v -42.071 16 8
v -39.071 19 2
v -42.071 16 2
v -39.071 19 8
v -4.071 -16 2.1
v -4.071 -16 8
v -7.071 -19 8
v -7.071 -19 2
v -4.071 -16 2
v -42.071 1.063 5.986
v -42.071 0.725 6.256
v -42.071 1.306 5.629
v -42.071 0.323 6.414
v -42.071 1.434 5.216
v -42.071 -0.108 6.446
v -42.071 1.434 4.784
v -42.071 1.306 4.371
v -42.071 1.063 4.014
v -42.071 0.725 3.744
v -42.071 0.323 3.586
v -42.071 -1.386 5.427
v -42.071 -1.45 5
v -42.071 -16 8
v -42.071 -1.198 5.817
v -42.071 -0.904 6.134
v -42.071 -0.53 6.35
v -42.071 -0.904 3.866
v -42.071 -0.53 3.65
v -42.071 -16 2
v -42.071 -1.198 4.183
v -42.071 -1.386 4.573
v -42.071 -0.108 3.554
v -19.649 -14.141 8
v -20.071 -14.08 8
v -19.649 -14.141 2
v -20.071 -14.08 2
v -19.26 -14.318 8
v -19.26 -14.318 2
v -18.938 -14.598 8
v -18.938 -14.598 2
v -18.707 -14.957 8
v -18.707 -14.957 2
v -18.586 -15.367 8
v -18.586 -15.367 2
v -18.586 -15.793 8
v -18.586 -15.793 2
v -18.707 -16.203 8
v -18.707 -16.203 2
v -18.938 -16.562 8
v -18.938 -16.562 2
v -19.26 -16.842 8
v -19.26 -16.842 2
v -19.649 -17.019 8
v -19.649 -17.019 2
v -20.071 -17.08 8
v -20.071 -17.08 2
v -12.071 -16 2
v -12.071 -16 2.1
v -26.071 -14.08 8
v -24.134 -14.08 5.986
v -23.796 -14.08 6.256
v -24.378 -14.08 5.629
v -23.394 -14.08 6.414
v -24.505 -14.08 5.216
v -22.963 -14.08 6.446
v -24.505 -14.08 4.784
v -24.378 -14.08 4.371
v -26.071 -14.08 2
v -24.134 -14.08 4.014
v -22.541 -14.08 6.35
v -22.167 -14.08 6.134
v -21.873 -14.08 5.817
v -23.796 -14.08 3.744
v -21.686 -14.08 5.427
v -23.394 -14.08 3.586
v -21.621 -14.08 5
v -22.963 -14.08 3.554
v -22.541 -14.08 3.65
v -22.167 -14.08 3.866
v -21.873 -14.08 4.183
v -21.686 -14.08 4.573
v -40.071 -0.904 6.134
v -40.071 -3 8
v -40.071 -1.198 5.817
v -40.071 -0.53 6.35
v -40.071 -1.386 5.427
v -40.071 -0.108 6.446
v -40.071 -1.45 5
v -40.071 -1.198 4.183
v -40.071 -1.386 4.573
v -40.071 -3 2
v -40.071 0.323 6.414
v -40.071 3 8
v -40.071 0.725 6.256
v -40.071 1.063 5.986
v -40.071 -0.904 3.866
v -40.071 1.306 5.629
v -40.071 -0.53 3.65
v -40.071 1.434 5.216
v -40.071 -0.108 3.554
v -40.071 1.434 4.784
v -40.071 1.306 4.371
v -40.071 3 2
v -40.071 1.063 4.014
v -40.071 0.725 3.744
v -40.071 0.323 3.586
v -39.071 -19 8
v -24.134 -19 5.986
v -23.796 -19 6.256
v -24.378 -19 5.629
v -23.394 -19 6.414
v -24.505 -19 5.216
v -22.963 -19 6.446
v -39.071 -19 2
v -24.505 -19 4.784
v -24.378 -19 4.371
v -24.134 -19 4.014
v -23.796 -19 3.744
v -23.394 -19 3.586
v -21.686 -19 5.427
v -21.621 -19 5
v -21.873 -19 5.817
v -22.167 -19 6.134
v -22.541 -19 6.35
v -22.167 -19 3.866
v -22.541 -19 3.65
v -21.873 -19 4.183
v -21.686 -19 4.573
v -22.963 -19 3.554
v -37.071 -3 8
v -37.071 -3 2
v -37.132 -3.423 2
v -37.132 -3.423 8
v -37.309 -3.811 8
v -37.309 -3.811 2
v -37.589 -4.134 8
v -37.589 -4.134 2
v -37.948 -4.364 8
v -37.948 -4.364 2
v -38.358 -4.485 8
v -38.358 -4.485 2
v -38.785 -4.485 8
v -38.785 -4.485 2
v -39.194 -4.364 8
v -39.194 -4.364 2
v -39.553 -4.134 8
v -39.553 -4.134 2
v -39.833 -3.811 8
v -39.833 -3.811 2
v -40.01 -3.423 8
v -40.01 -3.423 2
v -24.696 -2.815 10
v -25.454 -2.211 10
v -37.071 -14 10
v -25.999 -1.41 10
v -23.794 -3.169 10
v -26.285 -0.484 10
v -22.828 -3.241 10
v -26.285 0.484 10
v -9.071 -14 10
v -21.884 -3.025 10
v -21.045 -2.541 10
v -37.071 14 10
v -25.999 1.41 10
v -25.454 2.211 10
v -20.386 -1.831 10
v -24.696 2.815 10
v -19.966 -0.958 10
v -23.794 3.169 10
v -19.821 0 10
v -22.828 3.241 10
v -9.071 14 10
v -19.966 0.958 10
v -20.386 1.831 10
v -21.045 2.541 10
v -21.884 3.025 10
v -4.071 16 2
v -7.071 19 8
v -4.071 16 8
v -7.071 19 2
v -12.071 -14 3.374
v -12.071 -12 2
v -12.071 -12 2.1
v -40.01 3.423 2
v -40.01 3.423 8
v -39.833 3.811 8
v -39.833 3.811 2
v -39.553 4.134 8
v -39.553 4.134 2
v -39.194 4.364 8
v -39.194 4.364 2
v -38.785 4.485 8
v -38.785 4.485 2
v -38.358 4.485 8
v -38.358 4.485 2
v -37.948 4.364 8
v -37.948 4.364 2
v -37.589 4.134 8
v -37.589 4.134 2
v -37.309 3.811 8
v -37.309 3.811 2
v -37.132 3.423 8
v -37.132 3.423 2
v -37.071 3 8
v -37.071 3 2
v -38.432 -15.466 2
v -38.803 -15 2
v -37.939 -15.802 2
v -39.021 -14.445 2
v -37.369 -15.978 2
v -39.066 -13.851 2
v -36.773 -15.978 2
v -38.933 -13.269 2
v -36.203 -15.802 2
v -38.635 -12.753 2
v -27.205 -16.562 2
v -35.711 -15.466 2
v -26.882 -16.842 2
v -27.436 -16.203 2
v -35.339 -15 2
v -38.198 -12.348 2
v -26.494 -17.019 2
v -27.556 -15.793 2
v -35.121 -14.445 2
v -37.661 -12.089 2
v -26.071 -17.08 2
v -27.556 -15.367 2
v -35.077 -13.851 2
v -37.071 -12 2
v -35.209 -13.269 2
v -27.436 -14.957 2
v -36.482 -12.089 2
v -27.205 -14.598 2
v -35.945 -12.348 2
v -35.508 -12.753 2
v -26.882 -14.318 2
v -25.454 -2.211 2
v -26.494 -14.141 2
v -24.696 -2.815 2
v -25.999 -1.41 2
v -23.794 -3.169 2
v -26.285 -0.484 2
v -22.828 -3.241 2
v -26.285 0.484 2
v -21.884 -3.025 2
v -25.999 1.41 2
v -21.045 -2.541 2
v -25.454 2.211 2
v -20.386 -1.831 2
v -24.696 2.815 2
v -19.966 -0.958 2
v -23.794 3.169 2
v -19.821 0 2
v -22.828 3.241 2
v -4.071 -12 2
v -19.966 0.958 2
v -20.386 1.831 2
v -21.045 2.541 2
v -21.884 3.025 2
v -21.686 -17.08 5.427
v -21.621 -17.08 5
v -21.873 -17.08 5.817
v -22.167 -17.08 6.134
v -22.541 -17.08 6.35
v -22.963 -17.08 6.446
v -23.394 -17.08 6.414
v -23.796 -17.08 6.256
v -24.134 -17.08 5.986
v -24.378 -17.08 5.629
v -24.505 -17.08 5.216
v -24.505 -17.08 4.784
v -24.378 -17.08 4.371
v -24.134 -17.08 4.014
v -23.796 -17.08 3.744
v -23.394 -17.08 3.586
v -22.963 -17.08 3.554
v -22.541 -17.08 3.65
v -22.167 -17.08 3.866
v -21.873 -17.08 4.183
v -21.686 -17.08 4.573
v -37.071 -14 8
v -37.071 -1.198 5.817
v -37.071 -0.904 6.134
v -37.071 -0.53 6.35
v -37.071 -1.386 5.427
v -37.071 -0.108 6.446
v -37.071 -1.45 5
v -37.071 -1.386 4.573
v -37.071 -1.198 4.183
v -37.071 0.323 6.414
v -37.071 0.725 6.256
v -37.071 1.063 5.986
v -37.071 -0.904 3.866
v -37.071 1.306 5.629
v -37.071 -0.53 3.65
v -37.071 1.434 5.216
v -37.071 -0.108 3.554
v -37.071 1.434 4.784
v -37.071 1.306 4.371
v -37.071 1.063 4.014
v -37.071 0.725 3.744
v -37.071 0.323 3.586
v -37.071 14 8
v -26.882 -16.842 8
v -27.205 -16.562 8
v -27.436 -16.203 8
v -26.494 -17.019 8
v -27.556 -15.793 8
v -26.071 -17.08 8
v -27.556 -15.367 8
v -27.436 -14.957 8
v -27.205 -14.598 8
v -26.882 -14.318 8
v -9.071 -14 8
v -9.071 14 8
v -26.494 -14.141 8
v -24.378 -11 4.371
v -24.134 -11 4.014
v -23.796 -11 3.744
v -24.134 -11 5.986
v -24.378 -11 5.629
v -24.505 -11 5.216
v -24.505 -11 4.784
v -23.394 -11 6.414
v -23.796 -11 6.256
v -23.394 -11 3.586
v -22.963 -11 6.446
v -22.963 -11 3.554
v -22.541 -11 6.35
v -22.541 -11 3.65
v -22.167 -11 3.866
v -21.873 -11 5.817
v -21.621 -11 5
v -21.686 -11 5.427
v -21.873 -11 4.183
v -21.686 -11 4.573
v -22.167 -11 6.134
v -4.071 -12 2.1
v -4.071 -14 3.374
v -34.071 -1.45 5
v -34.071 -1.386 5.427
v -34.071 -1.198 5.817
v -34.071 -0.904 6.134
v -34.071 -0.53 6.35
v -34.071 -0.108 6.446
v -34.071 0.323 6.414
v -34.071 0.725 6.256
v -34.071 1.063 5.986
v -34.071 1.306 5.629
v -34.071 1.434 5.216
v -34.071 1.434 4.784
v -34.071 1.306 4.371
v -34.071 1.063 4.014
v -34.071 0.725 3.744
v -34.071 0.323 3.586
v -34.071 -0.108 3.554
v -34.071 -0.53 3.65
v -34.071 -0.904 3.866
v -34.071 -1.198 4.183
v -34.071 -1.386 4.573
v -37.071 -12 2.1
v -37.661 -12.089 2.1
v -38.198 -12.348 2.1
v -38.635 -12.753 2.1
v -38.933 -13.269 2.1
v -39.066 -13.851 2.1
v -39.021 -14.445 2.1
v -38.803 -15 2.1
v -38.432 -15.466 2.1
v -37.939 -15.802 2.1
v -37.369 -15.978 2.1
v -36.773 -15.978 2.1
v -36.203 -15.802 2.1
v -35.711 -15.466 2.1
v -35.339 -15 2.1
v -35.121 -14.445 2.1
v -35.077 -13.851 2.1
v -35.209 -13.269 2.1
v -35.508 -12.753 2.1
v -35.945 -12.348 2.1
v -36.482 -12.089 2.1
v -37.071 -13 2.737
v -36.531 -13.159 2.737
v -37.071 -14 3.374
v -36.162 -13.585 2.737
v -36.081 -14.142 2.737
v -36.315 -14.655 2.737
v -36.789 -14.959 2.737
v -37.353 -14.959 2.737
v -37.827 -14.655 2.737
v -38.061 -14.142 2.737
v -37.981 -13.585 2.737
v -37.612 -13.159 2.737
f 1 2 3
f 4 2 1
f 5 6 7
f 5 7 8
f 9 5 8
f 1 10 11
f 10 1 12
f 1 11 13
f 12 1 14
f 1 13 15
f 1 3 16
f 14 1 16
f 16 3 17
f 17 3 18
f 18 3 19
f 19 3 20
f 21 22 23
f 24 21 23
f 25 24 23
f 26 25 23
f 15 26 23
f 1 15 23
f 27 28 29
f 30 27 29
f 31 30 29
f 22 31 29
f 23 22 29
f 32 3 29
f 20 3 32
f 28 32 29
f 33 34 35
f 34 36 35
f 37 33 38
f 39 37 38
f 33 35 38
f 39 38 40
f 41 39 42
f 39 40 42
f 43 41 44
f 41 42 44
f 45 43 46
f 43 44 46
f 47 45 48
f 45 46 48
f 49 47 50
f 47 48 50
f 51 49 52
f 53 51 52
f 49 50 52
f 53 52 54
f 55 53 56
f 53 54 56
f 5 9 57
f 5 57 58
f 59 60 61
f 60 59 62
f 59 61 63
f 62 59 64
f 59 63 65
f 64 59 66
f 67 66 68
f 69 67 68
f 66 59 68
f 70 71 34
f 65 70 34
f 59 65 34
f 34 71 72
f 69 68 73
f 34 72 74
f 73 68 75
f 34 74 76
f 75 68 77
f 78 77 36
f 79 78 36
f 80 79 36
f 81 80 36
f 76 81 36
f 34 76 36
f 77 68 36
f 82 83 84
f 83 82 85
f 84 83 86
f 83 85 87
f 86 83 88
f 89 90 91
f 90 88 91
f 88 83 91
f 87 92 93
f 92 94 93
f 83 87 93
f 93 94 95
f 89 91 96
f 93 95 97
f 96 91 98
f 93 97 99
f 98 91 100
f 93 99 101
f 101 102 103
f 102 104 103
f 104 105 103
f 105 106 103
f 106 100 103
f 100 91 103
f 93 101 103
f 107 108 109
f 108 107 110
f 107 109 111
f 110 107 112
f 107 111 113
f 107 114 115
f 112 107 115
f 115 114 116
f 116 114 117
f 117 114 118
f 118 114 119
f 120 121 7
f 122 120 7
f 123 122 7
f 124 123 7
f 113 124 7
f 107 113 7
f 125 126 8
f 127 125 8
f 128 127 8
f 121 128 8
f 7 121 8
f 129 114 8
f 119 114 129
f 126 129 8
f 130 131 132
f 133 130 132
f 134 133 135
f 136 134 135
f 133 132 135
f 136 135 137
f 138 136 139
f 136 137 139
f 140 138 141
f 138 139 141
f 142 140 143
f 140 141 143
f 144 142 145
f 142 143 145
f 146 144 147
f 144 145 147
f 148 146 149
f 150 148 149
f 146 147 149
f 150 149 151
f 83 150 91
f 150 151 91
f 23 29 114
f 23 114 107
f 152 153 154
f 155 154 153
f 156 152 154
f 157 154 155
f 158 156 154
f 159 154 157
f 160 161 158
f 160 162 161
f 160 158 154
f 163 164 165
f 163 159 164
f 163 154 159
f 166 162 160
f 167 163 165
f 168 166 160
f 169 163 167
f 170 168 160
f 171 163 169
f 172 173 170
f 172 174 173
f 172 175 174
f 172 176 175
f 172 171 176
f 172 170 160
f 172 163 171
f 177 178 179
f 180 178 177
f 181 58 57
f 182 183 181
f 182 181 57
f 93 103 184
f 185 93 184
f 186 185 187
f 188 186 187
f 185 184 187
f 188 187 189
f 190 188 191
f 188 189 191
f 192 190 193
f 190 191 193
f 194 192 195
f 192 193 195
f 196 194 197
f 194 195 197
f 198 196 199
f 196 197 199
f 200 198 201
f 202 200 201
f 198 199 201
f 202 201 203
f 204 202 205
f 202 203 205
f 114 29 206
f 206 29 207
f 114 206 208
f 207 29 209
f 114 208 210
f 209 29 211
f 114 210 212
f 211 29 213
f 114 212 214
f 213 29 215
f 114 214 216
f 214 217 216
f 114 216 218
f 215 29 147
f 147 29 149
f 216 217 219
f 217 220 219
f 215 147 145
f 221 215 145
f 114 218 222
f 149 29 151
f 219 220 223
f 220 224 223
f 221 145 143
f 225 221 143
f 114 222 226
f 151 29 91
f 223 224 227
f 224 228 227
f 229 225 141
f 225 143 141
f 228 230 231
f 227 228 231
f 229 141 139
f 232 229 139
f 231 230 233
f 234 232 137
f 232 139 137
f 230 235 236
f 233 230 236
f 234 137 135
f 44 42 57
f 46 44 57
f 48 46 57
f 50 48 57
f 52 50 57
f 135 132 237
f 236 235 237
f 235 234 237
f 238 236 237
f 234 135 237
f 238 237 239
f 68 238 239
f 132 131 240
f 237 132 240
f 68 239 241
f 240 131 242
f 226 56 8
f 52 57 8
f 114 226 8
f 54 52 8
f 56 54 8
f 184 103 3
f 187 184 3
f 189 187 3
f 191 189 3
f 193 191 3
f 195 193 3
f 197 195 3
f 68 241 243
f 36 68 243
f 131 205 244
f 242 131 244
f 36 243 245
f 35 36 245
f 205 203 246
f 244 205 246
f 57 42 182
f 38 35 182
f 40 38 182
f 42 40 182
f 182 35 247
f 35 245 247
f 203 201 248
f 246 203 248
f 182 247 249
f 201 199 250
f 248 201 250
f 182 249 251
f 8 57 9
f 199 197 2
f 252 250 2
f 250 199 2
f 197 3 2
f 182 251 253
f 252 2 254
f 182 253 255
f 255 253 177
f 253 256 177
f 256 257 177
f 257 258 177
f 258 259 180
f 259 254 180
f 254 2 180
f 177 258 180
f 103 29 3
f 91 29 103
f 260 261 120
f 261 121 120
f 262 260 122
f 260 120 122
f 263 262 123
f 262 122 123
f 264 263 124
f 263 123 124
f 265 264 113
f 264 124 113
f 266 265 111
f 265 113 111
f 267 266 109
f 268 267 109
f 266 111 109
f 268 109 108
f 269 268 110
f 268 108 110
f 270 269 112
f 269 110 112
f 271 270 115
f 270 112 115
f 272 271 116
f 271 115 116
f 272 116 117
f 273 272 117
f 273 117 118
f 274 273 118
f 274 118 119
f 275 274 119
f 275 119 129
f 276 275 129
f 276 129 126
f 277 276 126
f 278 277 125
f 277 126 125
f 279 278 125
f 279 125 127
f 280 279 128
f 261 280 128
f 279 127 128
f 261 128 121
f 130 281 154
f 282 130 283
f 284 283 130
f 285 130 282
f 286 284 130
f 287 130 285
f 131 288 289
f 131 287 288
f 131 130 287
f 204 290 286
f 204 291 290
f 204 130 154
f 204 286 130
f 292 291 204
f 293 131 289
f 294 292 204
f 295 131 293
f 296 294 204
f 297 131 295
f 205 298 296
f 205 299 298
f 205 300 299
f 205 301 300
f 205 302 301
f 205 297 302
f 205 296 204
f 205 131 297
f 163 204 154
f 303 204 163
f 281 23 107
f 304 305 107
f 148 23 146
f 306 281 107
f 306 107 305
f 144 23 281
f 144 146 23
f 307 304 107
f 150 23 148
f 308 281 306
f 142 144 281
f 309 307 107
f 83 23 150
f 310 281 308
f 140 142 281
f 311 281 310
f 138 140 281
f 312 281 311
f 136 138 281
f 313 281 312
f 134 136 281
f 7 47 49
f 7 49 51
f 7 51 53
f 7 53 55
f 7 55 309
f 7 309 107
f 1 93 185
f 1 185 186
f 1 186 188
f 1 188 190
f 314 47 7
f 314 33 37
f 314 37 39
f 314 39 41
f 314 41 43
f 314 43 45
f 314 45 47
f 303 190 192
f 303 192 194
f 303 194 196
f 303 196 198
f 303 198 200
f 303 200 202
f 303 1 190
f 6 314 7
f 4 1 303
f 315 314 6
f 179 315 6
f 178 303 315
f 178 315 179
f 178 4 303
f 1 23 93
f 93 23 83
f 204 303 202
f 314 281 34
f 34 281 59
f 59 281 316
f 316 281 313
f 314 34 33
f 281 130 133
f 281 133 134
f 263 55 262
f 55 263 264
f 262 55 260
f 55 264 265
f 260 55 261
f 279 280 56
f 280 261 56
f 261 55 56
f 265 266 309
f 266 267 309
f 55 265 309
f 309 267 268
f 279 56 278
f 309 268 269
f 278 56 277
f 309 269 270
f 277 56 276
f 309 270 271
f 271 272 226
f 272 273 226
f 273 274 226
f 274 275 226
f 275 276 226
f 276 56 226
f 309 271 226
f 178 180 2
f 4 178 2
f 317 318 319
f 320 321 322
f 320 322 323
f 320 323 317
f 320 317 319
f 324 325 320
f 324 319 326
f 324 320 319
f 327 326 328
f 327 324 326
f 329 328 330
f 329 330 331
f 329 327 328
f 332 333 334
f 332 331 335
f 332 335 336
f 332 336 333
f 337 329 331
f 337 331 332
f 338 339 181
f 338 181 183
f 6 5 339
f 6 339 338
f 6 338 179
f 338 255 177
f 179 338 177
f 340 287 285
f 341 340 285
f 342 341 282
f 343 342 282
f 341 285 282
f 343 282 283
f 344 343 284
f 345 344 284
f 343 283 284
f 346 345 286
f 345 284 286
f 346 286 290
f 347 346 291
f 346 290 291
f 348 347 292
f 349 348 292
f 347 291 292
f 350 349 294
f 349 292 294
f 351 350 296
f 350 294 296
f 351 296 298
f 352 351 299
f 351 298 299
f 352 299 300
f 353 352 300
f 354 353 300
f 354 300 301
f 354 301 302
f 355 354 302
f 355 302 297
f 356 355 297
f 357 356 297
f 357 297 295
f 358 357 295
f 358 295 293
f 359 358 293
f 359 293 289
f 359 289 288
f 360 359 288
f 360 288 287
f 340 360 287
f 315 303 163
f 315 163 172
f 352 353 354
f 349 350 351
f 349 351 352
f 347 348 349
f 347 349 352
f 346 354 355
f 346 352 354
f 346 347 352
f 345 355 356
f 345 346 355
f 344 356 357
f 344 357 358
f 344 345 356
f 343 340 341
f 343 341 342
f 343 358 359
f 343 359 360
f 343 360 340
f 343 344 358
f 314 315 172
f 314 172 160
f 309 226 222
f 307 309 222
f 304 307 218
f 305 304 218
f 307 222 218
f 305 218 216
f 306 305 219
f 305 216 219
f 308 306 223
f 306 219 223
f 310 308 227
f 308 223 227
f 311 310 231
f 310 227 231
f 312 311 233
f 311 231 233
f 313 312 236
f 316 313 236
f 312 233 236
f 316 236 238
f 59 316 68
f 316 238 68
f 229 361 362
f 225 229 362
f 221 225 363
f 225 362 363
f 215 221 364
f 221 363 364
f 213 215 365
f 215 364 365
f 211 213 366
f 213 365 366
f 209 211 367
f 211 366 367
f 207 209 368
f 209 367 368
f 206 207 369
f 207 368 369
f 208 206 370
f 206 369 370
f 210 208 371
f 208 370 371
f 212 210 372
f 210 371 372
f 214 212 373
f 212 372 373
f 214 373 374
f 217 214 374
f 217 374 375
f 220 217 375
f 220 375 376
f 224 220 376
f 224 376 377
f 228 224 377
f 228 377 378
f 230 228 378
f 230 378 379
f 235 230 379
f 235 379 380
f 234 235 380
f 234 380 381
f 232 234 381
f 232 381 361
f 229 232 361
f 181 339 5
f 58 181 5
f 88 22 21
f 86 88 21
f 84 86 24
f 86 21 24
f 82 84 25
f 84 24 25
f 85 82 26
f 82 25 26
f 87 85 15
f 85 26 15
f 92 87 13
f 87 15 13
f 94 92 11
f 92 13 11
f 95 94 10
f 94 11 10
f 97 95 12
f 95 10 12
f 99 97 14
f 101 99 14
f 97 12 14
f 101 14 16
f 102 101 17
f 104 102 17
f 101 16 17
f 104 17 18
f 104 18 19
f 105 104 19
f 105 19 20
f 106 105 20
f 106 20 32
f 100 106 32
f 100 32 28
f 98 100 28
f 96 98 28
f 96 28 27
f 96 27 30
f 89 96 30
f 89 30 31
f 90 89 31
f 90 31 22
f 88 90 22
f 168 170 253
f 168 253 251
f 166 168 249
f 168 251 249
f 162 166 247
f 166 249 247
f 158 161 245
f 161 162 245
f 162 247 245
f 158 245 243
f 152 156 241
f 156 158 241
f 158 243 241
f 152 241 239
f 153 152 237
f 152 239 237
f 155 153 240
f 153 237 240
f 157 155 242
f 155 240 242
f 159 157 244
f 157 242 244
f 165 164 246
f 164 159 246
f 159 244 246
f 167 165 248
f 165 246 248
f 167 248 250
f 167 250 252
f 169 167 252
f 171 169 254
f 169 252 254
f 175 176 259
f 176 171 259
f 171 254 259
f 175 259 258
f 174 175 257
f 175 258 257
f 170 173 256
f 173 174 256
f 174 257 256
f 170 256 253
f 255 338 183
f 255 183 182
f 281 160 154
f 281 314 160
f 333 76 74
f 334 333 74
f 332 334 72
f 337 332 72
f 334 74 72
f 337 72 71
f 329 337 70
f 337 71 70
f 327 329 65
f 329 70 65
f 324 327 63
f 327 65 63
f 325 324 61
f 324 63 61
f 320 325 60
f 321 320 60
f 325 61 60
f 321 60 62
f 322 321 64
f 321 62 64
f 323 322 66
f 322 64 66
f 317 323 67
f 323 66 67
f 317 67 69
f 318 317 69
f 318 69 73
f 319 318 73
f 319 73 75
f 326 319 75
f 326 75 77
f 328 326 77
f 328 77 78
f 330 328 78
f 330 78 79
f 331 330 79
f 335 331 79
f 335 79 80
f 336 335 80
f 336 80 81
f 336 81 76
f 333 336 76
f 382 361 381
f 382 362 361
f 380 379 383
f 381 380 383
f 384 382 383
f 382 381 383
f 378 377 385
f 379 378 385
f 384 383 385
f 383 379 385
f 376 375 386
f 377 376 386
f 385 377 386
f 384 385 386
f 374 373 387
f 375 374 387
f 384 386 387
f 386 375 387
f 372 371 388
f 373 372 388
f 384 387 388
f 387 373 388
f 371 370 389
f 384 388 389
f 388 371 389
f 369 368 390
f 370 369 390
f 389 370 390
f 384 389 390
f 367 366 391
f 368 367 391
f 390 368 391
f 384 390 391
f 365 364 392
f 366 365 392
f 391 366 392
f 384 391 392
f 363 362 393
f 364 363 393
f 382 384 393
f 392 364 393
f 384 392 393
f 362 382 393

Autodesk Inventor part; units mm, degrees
ref_plane "YZ Plane" through (0, 0, 0) normal (1, 0, 0) x (0, 1, 0)
ref_plane "XZ Plane" through (0, 0, 0) normal (0, 1, 0) x (-1, 0, 0)
ref_plane "XY Plane" through (0, 0, 0) normal (0, 0, 1) x (1, 0, 0)
ref_plane "Work Plane1" through (0, 0, 2) normal (0, 0, 1) x (1, 0, 0)
sketch "Sketch1" plane through (0, 0, 2) normal (0, 0, 1) x (1, 0, 0)
  circle A0 centre (-37.0712, 14) radius 3.25 construction
  circle A1 centre (-9.0712, -14) radius 3.25 construction
  line L0 (-26.0712, -17.08) -> (-20.0712, -17.08) construction
  arc A2 (-20.0712, -17.08) -> (-20.0712, -14.08) centre (-20.0712, -15.58) ccw construction
  line L1 (-20.0712, -14.08) -> (-26.0712, -14.08) construction
  line L2 (-37.0712, -3) -> (-37.0712, 3) construction
  arc A3 (-37.0712, 3) -> (-40.0712, 3) centre (-38.5712, 3) ccw construction
  line L3 (-40.0712, 3) -> (-40.0712, -3) construction
  line L4 (-47.9712, -17) -> (-47.9712, 17) construction
  line L5 (-47.9712, 17) -> (-44.3964, 17) construction
  line L6 (-44.3964, 17) -> (-40.0712, 21.3252) construction
  line L7 (-40.0712, 21.3252) -> (-40.0712, 24.9) construction
  line L8 (-40.0712, 24.9) -> (-6.0712, 24.9) construction
  line L9 (-6.0712, 24.9) -> (-6.0712, 21.3252) construction
  line L10 (-6.0712, 21.3252) -> (-1.746, 17) construction
  line L11 (-1.746, 17) -> (1.8288, 17) construction
  line L12 (1.8288, 17) -> (1.8288, -17) construction
  line L13 (1.8288, -17) -> (-1.746, -17) construction
  line L14 (-1.746, -17) -> (-6.1126, -21.3666) construction
  line L15 (-6.1126, -21.3666) -> (-6.1126, -24.9) construction
  line L16 (-6.1126, -24.9) -> (-40.0712, -24.9) construction
  circle A4 centre (-37.0712, -14) radius 3.25 construction
  circle A5 centre (-23.0712, 0) radius 12.45 construction
  circle A6 centre (-23.0712, 0) radius 12.7 construction
  line L17 (-37.0712, 14) -> (-9.0712, 14) construction
  line L18 (-9.0712, 14) -> (-9.0712, -14) construction
  line L19 (-9.0712, -14) -> (-37.0712, -14) construction
  line L20 (-37.0712, -14) -> (-37.0712, 14) construction
  line L21 (-4.0712, -19) -> (-4.0712, 19)
  line L22 (-4.0712, 19) -> (-42.0712, 19)
  line L23 (-42.0712, 19) -> (-42.0712, -19)
  line L24 (-42.0712, -19) -> (-4.0712, -19)
  circle A7 centre (-23.0712, 0) radius 12.8
  circle A8 centre (-23.0712, 0) radius 3.25 projected
  line L25 (-40.0712, -24.9) -> (-40.0712, -21.3252) projected
  line L26 (-40.0712, -21.3252) -> (-44.3964, -17) projected
  line L27 (-44.3964, -17) -> (-47.9712, -17) projected
  arc A9 (-26.0712, -14.08) -> (-26.0712, -17.08) centre (-26.0712, -15.58) ccw projected
  arc A10 (-40.0712, -3) -> (-37.0712, -3) centre (-38.5712, -3) ccw projected
  circle A11 centre (-37.0712, -14) radius 3.25 projected
  point P0 (0, 0)
  point P1 (-21.8762, -3.0223)
  point P2 (-25.9925, 1.4242)
  dimension "d0" = 5
  dimension "d1" = 0.1
extrude "Extrusion1" add sketch "Sketch1" along normal blind 6 contours L24 L23 L22 L21 | A7 | A11
sketch "Sketch2" plane through (0, 0, 2) normal (0, 0, -1) x (-1, 0, 0)
  circle A0 centre (23.0712, 0) radius 12.8 projected
  circle A1 centre (23.0712, 0) radius 8.5824
  point P0 (0, 0)
extrude "Extrusion2" add sketch "Sketch2" against normal blind 0.5
sketch "Sketch3" plane through (0, 0, 2) normal (0, 0, -1) x (-1, 0, 0)
  circle A0 centre (9.0712, -14) radius 1.45 construction
  circle A1 centre (9.0712, -14) radius 2.45
  circle A2 centre (37.0712, -14) radius 1.45 projected
  circle A3 centre (37.0712, -14) radius 1.95
  point P0 (0, 0)
  dimension "d8" = 1
  dimension "d10" = 0.5
sketch "Sketch5" plane through (0, 0, 2) normal (0, 0, -1) x (-1, 0, 0)
  arc A0 (20.0712, -14.08) -> (20.0712, -17.08) centre (20.0712, -15.58) ccw projected
  arc A1 (26.0712, -17.08) -> (26.0712, -14.08) centre (26.0712, -15.58) ccw projected
  line L0 (37.0712, 3) -> (37.0712, -3) projected
  arc A2 (37.0712, -3) -> (40.0712, -3) centre (38.5712, -3) ccw projected
  line L1 (40.0712, -3) -> (40.0712, 3) projected
  arc A3 (40.0712, 3) -> (37.0712, 3) centre (38.5712, 3) ccw projected
  line L2 (26.0712, -14.08) -> (20.0712, -14.08) projected
  arc A4 (20.0712, -14.08) -> (20.0712, -17.08) centre (20.0712, -15.58) ccw projected
  line L3 (20.0712, -17.08) -> (26.0712, -17.08) projected
  arc A5 (26.0712, -17.08) -> (26.0712, -14.08) centre (26.0712, -15.58) ccw projected
  circle A6 centre (37.0712, -14) radius 1.45 projected
  circle A7 centre (23.0712, 0) radius 1.45 projected
  circle A8 centre (9.0712, -14) radius 1.45 projected
  circle A9 centre (37.0712, 14) radius 1.45 projected
  line L4 (-1.8288, -17) -> (-1.8288, 17) projected
  line L5 (-1.8288, 17) -> (1.746, 17) projected
  line L6 (1.746, 17) -> (6.0712, 21.3252) projected
  line L7 (6.0712, 21.3252) -> (6.0712, 24.9) projected
  line L8 (6.0712, 24.9) -> (40.0712, 24.9) projected
  line L9 (40.0712, 24.9) -> (40.0712, 21.3252) projected
  line L10 (40.0712, 21.3252) -> (44.3964, 17) projected
  line L11 (44.3964, 17) -> (47.9712, 17) projected
  line L12 (47.9712, 17) -> (47.9712, -17) projected
  line L13 (44.3964, -17) -> (47.9712, -17) projected
  line L14 (40.0712, -21.3252) -> (44.3964, -17) projected
  line L15 (40.0712, -24.9) -> (40.0712, -21.3252) projected
  line L16 (6.1126, -24.9) -> (40.0712, -24.9) projected
  line L17 (6.1126, -24.9) -> (6.1126, -21.3666) projected
  line L18 (6.1126, -21.3666) -> (1.746, -17) projected
  line L19 (1.746, -17) -> (-1.8288, -17) projected
  point P0 (0, 0)
  point P1 (40.0712, -3)
extrude "Extrusion5" cut sketch "Sketch5" against normal blind 8 contours L2 A1 L3 A0 | A3 L1 A2 L0
sketch "Sketch6" plane through (-42.0712, -19, 8) normal (0, -1, 0) x (1, 0, 0)
  line L0 (0, -6) -> (38, -6) projected
  line L1 (38, -6) -> (38, 0) projected
  line L2 (0, 0) -> (38, 0) projected
  line L3 (0, -6) -> (0, 0) projected
  line L4 (31.8, 0) -> (31.8, 0) projected
  circle A0 centre (19, -3) radius 1.45
  point P0 (42.0712, -8)
  point P1 (4.5, 0)
  dimension "d34" = 2.9
extrude "Extrusion6" cut sketch "Sketch6" against normal blind 8 contours A0
pattern_circular "Circular Pattern1" count 2 over 90 about axis through (-23.0712, 0, 2) along (0, 0, -1) of "Extrusion6"
chamfer "Chamfer1" distance 3 angle 45 4 edges at (-42.0712, 19, 5) (-4.0712, 19, 5) (-4.0712, -19, 5) (-42.0712, -19, 5)
hole "Hole1" at (-37.0712, -14, 2) direction (0, 0, 1) diameter 4 depth 0.1 tip angle 115
sketch "Sketch4" plane through (-4.0712, -19, 2) normal (1, 0, 0) x (0, 0, -1)
  line L0 (2, 4.45) -> (6, 4.45)
  line L1 (2, 1.55) -> (6, 1.55)
  line L2 (0, 0) -> (0, 38) projected
  arc A0 (2, 19) -> (2, 19) centre (1.5, 4.4206) ccw projected
  line L3 (-1.3741, 5) -> (-0.1, 7) projected
  line L4 (-1.3741, 5) -> (-0.1, 3) projected
  line L5 (-0.1, 7) -> (0.6045, 7)
  line L6 (0.6045, 7) -> (0.6045, 3)
  line L7 (0.6045, 3) -> (-0.1, 3)
  line L8 (-0.1, 3) -> (-0.1, 7)
extrude "Extrusion4" cut sketch "Sketch4" against normal blind 8 contours L7 L8 L5 L2 | L2 L5 L6 L7 | L4 L3 L8
sketch "Skizze8" plane through (0, 0, 8) normal (0, 0, 1) x (1, 0, 0)
  line L0 (-39.0712, -19) -> (-42.0712, -16) projected
  line L1 (-39.0712, -19) -> (-7.0712, -19) projected
  line L2 (-4.0712, -16) -> (-7.0712, -19) projected
  line L3 (-4.0712, -16) -> (-4.0712, 16) projected
  line L4 (-7.0712, 19) -> (-4.0712, 16) projected
  line L5 (-7.0712, 19) -> (-39.0712, 19) projected
  line L6 (-42.0712, 16) -> (-39.0712, 19) projected
  line L7 (-42.0712, 16) -> (-42.0712, -16) projected
  arc A0 (-37.0712, 3) -> (-40.0712, 3) centre (-38.5712, 3) ccw projected
  line L8 (-37.0712, 3) -> (-37.0712, -3) projected
  arc A1 (-40.0712, -3) -> (-37.0712, -3) centre (-38.5712, -3) ccw projected
  line L9 (-40.0712, -3) -> (-40.0712, 3) projected
  line L10 (-20.0712, -17.08) -> (-26.0712, -17.08) projected
  arc A2 (-26.0712, -14.08) -> (-26.0712, -17.08) centre (-26.0712, -15.58) ccw projected
  line L11 (-26.0712, -14.08) -> (-20.0712, -14.08) projected
  arc A3 (-20.0712, -17.08) -> (-20.0712, -14.08) centre (-20.0712, -15.58) ccw projected
  circle A4 centre (-23.0712, 0) radius 3.25 projected
  line L12 (-9.0712, -14) -> (-37.0712, -14)
  line L13 (-37.0712, -14) -> (-37.0712, 14)
  line L14 (-37.0712, 14) -> (-9.0712, 14)
  line L15 (-9.0712, 14) -> (-9.0712, -14)
  line L16 (-9.0712, -14) -> (-37.0712, 14) construction
  line L17 (-37.0712, -14) -> (-9.0712, 14) construction
  point P0 (0, 0)
extrude "Extrusion8" add sketch "Skizze8" along normal blind 2 contours L13 L14 L15 L12 L8
properties part number "20_Cube_Insert_Kinematic_Beautymirrormount_90_pro_v3"
